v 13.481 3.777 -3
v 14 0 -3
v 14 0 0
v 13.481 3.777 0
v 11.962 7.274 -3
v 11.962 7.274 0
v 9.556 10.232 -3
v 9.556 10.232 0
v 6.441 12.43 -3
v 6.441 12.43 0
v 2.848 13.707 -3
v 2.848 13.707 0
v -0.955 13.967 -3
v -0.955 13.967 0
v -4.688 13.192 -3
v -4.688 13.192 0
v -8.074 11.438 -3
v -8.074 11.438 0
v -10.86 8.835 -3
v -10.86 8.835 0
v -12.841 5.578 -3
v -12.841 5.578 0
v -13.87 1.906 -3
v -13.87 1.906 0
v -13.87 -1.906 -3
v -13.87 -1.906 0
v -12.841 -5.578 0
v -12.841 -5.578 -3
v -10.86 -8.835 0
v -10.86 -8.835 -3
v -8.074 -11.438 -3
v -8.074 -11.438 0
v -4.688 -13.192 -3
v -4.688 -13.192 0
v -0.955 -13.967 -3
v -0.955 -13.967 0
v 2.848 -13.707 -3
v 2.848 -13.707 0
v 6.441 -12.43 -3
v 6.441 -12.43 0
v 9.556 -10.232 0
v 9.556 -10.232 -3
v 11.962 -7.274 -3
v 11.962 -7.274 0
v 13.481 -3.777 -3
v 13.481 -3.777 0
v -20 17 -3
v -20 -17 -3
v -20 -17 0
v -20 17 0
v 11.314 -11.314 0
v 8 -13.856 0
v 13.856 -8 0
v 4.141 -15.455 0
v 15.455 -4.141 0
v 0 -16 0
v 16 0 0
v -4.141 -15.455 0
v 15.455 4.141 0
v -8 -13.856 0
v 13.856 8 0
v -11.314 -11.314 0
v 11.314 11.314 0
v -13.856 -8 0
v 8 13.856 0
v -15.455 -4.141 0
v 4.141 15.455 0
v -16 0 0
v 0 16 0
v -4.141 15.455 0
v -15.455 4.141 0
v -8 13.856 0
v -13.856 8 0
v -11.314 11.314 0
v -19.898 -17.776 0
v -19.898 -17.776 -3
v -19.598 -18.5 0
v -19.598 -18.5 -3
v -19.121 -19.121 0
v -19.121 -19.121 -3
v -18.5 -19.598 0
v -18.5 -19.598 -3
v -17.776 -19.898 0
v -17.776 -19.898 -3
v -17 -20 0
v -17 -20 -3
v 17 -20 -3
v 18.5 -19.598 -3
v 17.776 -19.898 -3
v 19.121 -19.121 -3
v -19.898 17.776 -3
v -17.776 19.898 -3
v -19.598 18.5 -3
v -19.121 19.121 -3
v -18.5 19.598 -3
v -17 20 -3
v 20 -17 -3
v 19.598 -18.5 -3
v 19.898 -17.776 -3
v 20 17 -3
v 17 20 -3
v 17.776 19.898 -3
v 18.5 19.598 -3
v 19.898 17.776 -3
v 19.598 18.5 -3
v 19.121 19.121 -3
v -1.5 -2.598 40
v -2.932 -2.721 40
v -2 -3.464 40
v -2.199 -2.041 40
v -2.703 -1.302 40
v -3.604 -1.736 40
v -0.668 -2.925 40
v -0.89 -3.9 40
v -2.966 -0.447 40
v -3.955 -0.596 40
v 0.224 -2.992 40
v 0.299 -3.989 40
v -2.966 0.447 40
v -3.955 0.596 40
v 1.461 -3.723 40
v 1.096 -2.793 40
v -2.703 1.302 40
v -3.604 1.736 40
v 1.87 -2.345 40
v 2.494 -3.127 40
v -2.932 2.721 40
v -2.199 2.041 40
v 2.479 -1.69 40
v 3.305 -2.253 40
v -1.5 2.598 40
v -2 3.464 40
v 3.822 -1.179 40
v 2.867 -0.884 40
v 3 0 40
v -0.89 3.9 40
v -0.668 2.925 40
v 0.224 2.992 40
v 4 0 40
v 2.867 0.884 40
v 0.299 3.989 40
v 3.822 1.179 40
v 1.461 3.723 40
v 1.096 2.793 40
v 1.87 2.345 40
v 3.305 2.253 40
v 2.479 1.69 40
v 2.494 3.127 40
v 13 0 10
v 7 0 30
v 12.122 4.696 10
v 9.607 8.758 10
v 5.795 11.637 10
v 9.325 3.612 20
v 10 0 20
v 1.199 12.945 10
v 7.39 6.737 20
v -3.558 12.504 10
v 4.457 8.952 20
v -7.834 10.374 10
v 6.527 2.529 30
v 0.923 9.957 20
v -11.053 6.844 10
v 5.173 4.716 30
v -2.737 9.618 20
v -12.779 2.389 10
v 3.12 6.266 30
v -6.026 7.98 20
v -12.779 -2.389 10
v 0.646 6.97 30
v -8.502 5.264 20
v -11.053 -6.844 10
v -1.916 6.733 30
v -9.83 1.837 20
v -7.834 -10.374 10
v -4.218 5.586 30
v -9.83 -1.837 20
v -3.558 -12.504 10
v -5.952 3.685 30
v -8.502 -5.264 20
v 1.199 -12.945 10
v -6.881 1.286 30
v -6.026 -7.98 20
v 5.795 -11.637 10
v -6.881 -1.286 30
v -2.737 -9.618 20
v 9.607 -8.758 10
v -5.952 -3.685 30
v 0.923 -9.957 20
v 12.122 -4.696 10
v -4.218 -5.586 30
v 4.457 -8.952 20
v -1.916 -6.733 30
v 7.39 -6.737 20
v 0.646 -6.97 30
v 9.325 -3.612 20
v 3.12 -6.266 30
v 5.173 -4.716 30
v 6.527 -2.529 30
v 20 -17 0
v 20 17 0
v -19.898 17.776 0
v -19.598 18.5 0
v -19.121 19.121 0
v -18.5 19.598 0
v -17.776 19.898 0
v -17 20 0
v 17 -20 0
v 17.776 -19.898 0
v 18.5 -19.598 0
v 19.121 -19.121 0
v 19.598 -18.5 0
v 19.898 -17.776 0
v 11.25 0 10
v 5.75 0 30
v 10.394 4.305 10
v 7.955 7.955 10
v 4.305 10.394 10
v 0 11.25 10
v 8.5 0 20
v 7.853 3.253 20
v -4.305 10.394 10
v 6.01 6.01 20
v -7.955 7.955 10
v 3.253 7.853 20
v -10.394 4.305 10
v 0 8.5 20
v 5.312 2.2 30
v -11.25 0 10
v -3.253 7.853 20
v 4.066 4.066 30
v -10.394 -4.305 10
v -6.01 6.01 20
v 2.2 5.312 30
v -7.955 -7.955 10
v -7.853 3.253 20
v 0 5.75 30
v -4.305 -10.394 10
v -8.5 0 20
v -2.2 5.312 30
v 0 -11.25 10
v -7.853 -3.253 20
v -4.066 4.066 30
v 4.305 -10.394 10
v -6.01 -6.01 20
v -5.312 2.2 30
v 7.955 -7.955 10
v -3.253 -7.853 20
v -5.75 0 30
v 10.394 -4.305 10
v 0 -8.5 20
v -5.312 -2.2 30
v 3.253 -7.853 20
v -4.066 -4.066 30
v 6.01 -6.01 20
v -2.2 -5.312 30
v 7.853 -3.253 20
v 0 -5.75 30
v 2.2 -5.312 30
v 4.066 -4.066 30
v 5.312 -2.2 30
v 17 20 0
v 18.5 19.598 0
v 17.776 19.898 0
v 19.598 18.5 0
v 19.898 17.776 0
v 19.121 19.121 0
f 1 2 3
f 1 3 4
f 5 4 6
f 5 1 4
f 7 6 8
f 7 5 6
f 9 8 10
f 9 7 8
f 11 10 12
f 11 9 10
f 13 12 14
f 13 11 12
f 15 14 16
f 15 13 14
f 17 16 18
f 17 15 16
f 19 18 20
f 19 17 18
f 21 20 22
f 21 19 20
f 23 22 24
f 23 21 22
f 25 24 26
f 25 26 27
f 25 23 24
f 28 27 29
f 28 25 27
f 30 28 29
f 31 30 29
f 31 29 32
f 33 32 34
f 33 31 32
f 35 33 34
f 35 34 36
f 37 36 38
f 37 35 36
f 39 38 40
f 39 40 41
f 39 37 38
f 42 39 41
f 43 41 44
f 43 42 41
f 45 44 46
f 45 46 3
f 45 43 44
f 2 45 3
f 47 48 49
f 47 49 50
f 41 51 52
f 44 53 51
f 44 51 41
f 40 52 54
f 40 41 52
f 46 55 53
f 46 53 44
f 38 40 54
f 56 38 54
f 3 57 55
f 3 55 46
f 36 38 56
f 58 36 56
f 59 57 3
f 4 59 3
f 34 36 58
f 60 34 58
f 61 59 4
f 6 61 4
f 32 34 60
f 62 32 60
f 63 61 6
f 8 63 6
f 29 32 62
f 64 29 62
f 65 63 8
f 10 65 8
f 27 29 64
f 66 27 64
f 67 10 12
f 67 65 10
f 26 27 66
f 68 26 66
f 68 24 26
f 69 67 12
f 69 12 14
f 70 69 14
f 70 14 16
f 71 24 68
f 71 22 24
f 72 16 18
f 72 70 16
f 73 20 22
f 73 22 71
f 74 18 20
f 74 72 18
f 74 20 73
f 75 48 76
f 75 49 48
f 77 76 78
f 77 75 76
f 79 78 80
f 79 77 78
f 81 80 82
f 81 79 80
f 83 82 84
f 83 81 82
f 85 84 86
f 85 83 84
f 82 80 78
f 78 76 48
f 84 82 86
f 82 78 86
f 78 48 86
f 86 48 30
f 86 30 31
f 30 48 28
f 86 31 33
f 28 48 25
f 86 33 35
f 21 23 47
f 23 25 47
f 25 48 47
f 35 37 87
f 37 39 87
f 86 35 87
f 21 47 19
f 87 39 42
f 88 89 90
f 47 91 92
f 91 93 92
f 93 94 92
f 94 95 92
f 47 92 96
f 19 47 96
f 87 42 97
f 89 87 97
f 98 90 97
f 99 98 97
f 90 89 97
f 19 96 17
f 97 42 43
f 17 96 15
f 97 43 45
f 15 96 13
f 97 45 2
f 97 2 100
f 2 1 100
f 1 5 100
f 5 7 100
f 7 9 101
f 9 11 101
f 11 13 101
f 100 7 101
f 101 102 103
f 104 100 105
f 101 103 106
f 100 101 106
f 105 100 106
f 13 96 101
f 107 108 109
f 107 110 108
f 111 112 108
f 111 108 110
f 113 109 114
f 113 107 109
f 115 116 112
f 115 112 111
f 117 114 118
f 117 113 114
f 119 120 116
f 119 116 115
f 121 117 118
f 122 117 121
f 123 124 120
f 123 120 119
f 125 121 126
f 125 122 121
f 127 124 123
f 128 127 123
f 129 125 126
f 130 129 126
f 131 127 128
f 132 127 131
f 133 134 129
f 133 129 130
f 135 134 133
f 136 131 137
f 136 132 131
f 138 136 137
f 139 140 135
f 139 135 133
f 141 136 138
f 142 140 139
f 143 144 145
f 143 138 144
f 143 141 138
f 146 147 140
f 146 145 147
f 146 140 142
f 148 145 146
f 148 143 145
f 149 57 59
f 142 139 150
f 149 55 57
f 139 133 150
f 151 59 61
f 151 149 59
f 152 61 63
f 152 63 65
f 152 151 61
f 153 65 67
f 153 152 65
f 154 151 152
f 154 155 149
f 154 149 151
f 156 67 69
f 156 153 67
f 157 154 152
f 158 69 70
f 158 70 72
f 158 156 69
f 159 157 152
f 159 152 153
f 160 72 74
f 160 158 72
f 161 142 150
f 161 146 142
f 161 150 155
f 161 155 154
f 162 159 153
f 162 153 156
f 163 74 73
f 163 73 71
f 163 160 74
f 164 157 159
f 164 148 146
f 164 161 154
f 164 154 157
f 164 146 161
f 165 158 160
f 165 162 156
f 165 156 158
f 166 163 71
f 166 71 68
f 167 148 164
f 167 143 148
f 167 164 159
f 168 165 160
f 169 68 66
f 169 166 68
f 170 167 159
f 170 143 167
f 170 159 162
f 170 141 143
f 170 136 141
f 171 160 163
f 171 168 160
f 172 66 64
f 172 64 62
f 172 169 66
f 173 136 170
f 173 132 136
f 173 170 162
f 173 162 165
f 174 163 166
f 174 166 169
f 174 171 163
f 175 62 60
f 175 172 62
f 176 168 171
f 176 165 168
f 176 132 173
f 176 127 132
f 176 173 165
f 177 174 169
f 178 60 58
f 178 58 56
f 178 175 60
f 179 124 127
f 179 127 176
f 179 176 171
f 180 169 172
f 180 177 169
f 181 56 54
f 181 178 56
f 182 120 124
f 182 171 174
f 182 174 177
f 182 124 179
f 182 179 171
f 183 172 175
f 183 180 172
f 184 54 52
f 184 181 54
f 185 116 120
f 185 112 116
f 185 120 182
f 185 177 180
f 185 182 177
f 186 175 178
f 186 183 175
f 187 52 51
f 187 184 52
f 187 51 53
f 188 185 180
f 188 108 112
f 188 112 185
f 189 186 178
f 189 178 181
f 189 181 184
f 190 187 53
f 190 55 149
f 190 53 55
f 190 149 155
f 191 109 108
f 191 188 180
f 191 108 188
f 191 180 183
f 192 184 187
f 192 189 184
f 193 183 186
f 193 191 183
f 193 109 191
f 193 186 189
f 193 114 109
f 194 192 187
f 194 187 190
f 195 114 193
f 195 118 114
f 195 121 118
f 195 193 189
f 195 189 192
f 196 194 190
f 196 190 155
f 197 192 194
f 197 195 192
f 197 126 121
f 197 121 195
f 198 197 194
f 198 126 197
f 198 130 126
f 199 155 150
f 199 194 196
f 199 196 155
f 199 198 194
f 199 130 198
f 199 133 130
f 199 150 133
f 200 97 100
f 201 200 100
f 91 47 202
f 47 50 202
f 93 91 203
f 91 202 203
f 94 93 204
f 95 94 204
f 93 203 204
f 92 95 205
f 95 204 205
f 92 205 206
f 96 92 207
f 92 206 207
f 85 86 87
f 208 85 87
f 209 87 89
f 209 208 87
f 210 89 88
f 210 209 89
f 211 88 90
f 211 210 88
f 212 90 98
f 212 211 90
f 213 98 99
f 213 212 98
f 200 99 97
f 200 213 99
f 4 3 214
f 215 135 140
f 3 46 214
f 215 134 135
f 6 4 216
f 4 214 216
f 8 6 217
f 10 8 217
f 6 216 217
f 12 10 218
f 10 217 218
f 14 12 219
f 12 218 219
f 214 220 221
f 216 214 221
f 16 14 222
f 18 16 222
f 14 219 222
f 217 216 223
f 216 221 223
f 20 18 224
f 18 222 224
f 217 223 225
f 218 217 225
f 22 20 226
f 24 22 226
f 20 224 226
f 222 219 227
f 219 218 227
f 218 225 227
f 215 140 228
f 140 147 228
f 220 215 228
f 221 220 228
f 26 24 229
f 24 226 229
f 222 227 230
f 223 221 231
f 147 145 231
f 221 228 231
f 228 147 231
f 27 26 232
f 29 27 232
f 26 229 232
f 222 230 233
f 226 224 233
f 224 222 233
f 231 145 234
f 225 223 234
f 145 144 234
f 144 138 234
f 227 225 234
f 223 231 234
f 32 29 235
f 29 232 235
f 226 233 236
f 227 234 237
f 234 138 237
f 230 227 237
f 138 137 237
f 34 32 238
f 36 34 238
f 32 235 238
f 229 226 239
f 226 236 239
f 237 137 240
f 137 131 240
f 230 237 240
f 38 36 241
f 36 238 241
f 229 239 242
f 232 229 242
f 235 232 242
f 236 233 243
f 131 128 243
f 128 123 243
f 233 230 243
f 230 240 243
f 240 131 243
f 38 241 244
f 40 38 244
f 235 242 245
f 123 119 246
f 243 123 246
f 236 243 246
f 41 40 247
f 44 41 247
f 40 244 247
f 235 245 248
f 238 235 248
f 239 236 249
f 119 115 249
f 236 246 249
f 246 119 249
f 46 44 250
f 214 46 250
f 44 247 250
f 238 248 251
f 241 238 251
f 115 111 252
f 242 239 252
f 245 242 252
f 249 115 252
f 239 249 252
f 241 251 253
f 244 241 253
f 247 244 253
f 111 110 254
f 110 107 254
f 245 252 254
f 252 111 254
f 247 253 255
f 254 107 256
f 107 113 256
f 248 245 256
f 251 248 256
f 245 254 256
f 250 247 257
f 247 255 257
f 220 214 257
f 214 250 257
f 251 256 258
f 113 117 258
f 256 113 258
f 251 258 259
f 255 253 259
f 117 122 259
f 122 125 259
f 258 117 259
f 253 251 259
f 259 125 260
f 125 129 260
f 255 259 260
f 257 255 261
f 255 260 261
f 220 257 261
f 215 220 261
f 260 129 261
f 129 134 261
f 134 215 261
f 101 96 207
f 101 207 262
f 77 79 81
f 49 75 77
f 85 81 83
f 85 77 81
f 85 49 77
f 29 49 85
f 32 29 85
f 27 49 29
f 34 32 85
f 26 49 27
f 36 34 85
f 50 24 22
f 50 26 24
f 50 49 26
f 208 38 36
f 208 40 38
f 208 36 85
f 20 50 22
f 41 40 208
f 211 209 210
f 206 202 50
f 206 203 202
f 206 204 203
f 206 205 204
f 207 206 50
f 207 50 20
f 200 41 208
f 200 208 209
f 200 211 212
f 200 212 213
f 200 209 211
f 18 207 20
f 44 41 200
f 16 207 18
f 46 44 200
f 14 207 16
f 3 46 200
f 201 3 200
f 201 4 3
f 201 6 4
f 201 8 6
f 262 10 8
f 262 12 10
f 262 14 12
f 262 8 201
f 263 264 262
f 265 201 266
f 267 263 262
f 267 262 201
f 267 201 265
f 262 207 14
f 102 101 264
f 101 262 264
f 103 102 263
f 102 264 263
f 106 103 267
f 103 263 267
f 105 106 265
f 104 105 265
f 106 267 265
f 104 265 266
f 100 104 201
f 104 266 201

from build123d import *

# Parameters (mm, degrees)
CYLINDER_R     = 14
CYLINDER_DEPTH = 3
BOX_W          = 40
BOX_H          = 40
BOX_DEPTH      = 3
FILLET_R       = 3


with BuildPart() as con001:
    # Cone001 → Cone001 (revolve)
    with BuildSketch(Plane.XZ):
        Polygon((0, 0), (14, 0), (3, 40), (0, 40), align=None)
    revolve(axis=Axis((0, 0, 0), (0, 0, 1)))


with BuildPart() as cut:
    # Cone → Cone (revolve)
    with BuildSketch(Plane.XZ):
        Polygon((0, 0), (16, 0), (4, 40), (0, 40), align=None)
    revolve(axis=Axis((0, 0, 0), (0, 0, 1)))

    # Cut: cut Con001
    add(con001.part, mode=Mode.SUBTRACT)


with BuildPart() as cilindre:
    # Cylinder → Cylinder (new body)
    with BuildSketch(Plane.XY.offset(-3)):
        Circle(CYLINDER_R)
    extrude(amount=CYLINDER_DEPTH)


with BuildPart() as fillet_body:
    # Box → Box (new body)
    with BuildSketch(Plane(origin=(-20, -20, -3), x_dir=(1, 0, 0), z_dir=(0, 0, 1))):
        with Locations((20, 20)):
            Rectangle(BOX_W, BOX_H)
    extrude(amount=BOX_DEPTH)

    # Cut001: cut Cilindre
    add(cilindre.part, mode=Mode.SUBTRACT)

    # Fillet
    fillet_edges = [fillet_body.edges().sort_by_distance(p)[0] for p in [
        (-20, -20, -1.5),
        (-20, 20, -1.5),
        (20, -20, -1.5),
        (20, 20, -1.5),
    ]]
    fillet(fillet_edges, radius=FILLET_R)


solid = Compound([cut.part, fillet_body.part])
